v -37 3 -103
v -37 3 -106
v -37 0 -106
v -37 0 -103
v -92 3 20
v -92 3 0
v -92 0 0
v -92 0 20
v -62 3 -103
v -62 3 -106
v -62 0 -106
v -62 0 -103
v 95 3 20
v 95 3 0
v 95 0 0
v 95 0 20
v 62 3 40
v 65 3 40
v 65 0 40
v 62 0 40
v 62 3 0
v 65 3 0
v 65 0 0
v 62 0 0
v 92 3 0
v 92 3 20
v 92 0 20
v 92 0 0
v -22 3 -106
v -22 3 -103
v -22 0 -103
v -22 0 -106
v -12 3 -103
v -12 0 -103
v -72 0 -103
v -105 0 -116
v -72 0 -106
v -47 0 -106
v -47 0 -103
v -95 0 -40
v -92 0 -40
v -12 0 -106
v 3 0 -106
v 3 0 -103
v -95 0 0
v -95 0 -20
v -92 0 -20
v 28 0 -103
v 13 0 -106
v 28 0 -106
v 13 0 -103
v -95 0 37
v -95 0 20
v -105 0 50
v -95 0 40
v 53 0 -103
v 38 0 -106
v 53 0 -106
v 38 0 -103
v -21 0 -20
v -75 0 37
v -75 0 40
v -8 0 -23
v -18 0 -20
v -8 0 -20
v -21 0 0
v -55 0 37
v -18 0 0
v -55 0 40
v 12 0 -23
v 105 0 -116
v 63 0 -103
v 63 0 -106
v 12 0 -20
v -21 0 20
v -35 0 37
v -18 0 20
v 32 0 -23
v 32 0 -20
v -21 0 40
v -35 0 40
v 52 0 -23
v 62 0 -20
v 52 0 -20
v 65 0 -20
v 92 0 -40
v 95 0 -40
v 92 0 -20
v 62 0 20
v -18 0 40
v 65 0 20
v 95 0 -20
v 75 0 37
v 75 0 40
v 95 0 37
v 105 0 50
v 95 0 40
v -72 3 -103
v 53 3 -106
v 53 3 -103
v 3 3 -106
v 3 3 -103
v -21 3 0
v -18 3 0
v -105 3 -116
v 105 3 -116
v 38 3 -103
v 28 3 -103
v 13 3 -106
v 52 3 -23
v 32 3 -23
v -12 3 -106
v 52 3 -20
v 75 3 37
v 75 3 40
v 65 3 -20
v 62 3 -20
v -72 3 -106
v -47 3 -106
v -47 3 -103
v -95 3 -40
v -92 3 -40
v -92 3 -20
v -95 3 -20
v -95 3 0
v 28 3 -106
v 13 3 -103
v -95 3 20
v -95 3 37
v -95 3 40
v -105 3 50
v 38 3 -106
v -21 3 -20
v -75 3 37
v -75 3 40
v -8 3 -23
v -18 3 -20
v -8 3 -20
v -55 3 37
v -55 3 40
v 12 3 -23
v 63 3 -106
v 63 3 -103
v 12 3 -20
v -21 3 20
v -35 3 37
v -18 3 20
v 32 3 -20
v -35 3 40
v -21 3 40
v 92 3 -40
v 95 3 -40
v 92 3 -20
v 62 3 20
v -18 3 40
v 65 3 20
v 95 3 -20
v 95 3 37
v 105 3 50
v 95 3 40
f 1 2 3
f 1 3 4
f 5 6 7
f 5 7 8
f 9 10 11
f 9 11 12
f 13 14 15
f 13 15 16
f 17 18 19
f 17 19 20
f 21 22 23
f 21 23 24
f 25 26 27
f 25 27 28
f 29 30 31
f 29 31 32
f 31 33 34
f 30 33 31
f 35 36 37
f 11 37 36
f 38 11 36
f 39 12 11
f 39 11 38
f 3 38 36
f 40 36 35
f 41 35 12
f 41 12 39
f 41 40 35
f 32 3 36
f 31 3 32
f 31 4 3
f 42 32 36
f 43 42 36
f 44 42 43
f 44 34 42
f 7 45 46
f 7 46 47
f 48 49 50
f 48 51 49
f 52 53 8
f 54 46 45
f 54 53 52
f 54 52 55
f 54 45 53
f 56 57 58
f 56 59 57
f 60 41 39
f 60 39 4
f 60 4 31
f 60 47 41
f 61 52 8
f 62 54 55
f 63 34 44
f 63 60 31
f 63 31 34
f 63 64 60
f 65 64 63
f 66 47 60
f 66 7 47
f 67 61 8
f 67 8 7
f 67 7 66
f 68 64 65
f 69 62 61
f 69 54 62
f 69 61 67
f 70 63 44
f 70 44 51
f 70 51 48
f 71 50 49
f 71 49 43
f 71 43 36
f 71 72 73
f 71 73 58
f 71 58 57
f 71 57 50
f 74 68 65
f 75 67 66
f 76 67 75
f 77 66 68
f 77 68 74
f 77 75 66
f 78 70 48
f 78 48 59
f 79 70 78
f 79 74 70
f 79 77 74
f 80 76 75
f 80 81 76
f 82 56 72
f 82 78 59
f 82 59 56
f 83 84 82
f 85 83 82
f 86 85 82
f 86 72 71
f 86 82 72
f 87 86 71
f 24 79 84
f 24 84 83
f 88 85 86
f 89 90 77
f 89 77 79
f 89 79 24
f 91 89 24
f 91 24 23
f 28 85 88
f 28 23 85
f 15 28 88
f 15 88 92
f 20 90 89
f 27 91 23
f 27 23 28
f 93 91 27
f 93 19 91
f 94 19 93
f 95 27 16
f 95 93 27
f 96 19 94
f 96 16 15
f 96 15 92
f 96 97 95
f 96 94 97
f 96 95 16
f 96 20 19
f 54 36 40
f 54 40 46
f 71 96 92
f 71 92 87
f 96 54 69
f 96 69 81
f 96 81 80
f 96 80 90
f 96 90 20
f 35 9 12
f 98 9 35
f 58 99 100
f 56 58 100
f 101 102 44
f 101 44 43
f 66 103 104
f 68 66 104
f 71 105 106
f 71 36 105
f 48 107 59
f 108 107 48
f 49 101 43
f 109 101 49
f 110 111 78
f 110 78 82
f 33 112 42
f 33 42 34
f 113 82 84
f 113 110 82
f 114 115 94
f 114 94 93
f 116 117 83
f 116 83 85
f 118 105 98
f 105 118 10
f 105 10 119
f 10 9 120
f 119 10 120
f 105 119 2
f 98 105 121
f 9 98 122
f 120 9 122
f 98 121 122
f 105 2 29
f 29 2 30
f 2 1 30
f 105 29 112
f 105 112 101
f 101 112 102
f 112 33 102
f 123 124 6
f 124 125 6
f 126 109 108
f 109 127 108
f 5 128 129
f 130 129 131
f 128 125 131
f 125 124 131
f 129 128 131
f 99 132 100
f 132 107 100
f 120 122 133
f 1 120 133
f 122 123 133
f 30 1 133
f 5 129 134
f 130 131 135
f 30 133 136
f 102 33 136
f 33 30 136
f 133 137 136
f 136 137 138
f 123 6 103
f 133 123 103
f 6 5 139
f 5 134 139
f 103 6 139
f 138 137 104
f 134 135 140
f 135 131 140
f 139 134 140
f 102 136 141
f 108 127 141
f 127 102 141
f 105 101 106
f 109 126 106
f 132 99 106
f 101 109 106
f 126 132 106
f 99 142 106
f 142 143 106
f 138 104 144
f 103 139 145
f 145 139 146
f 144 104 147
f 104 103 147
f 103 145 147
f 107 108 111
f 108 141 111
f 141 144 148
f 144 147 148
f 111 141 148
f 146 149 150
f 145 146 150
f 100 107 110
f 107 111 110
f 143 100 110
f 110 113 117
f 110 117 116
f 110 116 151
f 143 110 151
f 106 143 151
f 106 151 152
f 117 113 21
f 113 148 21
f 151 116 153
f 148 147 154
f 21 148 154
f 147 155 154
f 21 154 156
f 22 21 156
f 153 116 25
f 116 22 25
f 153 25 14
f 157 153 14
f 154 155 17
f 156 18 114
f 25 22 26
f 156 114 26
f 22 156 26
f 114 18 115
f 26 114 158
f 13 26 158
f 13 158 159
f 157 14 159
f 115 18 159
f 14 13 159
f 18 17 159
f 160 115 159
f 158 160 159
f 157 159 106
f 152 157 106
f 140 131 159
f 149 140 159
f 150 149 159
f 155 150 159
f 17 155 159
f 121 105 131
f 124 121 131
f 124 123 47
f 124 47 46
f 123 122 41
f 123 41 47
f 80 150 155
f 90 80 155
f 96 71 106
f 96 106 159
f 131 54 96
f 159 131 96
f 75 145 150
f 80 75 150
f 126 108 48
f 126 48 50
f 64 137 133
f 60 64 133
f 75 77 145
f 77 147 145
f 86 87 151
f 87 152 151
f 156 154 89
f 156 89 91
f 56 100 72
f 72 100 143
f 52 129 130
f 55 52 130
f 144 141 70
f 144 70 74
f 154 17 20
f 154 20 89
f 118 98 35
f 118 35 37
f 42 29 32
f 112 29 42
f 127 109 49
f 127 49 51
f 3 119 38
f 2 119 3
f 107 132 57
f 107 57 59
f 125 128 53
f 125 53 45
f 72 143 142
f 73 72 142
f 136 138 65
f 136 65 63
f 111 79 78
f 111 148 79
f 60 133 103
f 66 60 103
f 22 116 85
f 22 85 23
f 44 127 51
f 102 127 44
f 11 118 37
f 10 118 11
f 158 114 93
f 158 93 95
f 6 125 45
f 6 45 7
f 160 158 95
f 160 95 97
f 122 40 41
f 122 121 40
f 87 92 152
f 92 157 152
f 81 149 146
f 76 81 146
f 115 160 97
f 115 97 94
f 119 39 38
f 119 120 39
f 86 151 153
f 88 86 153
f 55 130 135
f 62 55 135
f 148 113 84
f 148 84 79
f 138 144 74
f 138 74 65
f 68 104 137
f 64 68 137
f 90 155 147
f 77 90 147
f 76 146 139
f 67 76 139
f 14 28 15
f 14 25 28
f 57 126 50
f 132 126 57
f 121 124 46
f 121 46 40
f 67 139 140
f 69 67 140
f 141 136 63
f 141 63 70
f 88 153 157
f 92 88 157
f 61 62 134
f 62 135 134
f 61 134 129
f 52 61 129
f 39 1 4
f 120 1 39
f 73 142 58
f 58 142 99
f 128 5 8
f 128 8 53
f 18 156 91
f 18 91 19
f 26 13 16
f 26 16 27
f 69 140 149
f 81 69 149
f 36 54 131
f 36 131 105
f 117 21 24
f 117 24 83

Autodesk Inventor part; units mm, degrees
ref_plane "YZ Plane" through (0, 0, 0) normal (1, 0, 0) x (0, 1, 0)
ref_plane "XZ Plane" through (0, 0, 0) normal (0, 1, 0) x (-1, 0, 0)
ref_plane "XY Plane" through (0, 0, 0) normal (0, 0, 1) x (1, 0, 0)
sketch "Sketch1" plane through (0, 0, 0) normal (0, 1, 0) x (-1, 0, 0)
  point P0 (0, 0)
sketch "Sketch2" plane through (0, 0, 0) normal (0, 1, 0) x (-1, 0, 0)
  line L0 (105, 50) -> (-105, 50)
  line L1 (-105, 50) -> (-105, -50)
  line L2 (-105, -50) -> (105, -50)
  line L3 (105, -50) -> (105, 50)
  line L4 (105, 50) -> (-105, -50) construction
  line L5 (-105, 50) -> (105, -50) construction
  point P0 (0, 0)
  dimension "d0" = 210
  dimension "d1" = 100
extrude "Extrusion1" add sketch "Sketch2" along normal blind 3
sketch "Sketch3" plane through (0, 3, 0) normal (0, 1, 0) x (1, 0, 0)
  line L0 (-21, 0) -> (-18, 0)
  line L1 (-18, 0) -> (-18, 20)
  line L2 (-18, 20) -> (-21, 20)
  line L3 (-21, 20) -> (-21, 0)
  line L4 (-21, 0) -> (-18, 20) construction
  line L5 (-18, 0) -> (-21, 20) construction
  line L6 (105, 50) -> (-105, 50) projected
  line L7 (62, 20) -> (65, 20)
  line L8 (65, 20) -> (65, 0)
  line L9 (65, 0) -> (62, 0)
  line L10 (62, 0) -> (62, 20)
  line L11 (62, 20) -> (65, 0) construction
  line L12 (65, 20) -> (62, 0) construction
  line L13 (105, -50) -> (105, 50) projected
  line L14 (-21, -40) -> (-18, -40)
  line L15 (-18, -40) -> (-18, -20)
  line L16 (-18, -20) -> (-21, -20)
  line L17 (-21, -20) -> (-21, -40)
  line L18 (-21, -40) -> (-18, -20) construction
  line L19 (-18, -40) -> (-21, -20) construction
  line L20 (-105, -50) -> (105, -50) projected
  line L21 (62, -20) -> (65, -20)
  line L22 (65, -20) -> (65, -40)
  line L23 (65, -40) -> (62, -40)
  line L24 (62, -40) -> (62, -20)
  line L25 (62, -20) -> (65, -40) construction
  line L26 (65, -20) -> (62, -40) construction
  line L27 (-8, 24.65) -> (12, 24.65)
  line L28 (12, 24.65) -> (12, 21.65)
  line L29 (12, 21.65) -> (-8, 21.65)
  line L30 (-8, 21.65) -> (-8, 24.65)
  line L31 (-8, 24.65) -> (12, 21.65) construction
  line L32 (12, 24.65) -> (-8, 21.65) construction
  line L33 (32, 24.65) -> (52, 24.65)
  line L34 (52, 24.65) -> (52, 21.65)
  line L35 (52, 21.65) -> (32, 21.65)
  line L36 (32, 21.65) -> (32, 24.65)
  line L37 (32, 24.65) -> (52, 21.65) construction
  line L38 (52, 24.65) -> (32, 21.65) construction
  line L39 (-105, -50) -> (105, -50) projected
  line L40 (105, -50) -> (105, 50) projected
  line L41 (105, 50) -> (-105, 50) projected
  line L42 (-105, 50) -> (-105, -50) projected
  point P0 (0, 0)
  point P1 (-19.5, 10)
  point P2 (63.5, 10)
  point P3 (-19.5, -30)
  point P4 (63.5, -30)
  point P5 (2, 23.15)
  point P6 (42, 23.15)
  dimension "d4" = 3
  dimension "d5" = 20
  dimension "d6" = 30
  dimension "d7" = 3
  dimension "d8" = 20
  dimension "d9" = 30
  dimension "d10" = 80
  dimension "d11" = 40
  dimension "d14" = 20
  dimension "d15" = 10
  dimension "d16" = 20
  dimension "d17" = 3
  dimension "d18" = 10
  dimension "d19" = 20
  dimension "d20" = 3
  dimension "d21" = 10
extrude "Extrusion2" cut sketch "Sketch3" against normal through all contours L3 L2 L1 L0 | L7 L8 L9 L10
sketch "Sketch4" plane through (0, 3, 0) normal (0, 1, 0) x (1, 0, 0)
  point P0 (0, 0)
sketch "Sketch5" plane through (0, 3, 0) normal (0, 1, 0) x (1, 0, 0)
  line L0 (-21, 0) -> (-21, 20) projected
  line L1 (-18, 20) -> (-18, 0) projected
  line L2 (-21, 20) -> (-18, 20) projected
  line L3 (-18, 0) -> (-21, 0) projected
  line L4 (62, 0) -> (62, 20) projected
  line L5 (65, 0) -> (62, 0) projected
  line L6 (65, 20) -> (65, 0) projected
  line L7 (62, 20) -> (65, 20) projected
  point P0 (0, 0)
sketch "Sketch6" plane through (0, 3, 0) normal (0, 1, 0) x (1, 0, 0)
  line L0 (-21, 0) -> (-18, 0)
  line L1 (-18, 0) -> (-18, 20)
  line L2 (-18, 20) -> (-21, 20)
  line L3 (-21, 20) -> (-21, 0)
  line L4 (-21, 0) -> (-18, 20) construction
  line L5 (-18, 0) -> (-21, 20) construction
  line L6 (105, 50) -> (-105, 50)
  line L7 (62, 20) -> (65, 20)
  line L8 (65, 20) -> (65, 0)
  line L9 (65, 0) -> (62, 0)
  line L10 (62, 0) -> (62, 20)
  line L11 (62, 20) -> (65, 0) construction
  line L12 (65, 20) -> (62, 0) construction
  line L13 (105, -50) -> (105, 50)
  line L14 (-21, -40) -> (-18, -40)
  line L15 (-18, -40) -> (-18, -20)
  line L16 (-18, -20) -> (-21, -20)
  line L17 (-21, -20) -> (-21, -40)
  line L18 (-21, -40) -> (-18, -20) construction
  line L19 (-18, -40) -> (-21, -20) construction
  line L20 (-105, -50) -> (105, -50)
  line L21 (62, -20) -> (65, -20)
  line L22 (65, -20) -> (65, -40)
  line L23 (65, -40) -> (62, -40)
  line L24 (62, -40) -> (62, -20)
  line L25 (62, -20) -> (65, -40) construction
  line L26 (65, -20) -> (62, -40) construction
  line L27 (-8, 23) -> (12, 23)
  line L28 (12, 23) -> (12, 20)
  line L29 (12, 20) -> (-8, 20)
  line L30 (-8, 20) -> (-8, 23)
  line L31 (-8, 23) -> (12, 20) construction
  line L32 (12, 23) -> (-8, 20) construction
  line L33 (32, 23) -> (52, 23)
  line L34 (52, 23) -> (52, 20)
  line L35 (52, 20) -> (32, 20)
  line L36 (32, 20) -> (32, 23)
  line L37 (32, 23) -> (52, 20) construction
  line L38 (52, 23) -> (32, 20) construction
  line L39 (-105, -50) -> (105, -50)
  line L40 (105, -50) -> (105, 50)
  line L41 (105, 50) -> (-105, 50)
  line L42 (-105, 50) -> (-105, -50)
  point P0 (0, 0)
  point P1 (0, 0)
  point P2 (-19.5, 10)
  point P3 (63.5, 10)
  point P4 (-19.5, -30)
  point P5 (63.5, -30)
  point P6 (2, 21.5)
  point P7 (42, 21.5)
  dimension "d22" = 3
  dimension "d23" = 20
  dimension "d24" = 30
  dimension "d25" = 3
  dimension "d26" = 20
  dimension "d27" = 30
  dimension "d28" = 80
  dimension "d29" = 40
  dimension "d30" = 20
  dimension "d31" = 10
  dimension "d32" = 20
  dimension "d33" = 3
  dimension "d34" = 10
  dimension "d35" = 20
  dimension "d36" = 3
  dimension "d37" = 10
  dimension "d41" = 100
  dimension "d42" = 70
extrude "Extrusion3" cut sketch "Sketch6" against normal through all contours L17 L16 L15 L14 | L21 L22 L23 L24 | L27 L28 L29 L30 | L33 L34 L35 L36
sketch "Sketch7" plane through (0, 3, 0) normal (0, 1, 0) x (1, 0, 0)
  line L0 (-21, -40) -> (-21, -20) projected
  line L1 (-18, -20) -> (-18, -40) projected
  line L2 (-21, -20) -> (-18, -20) projected
  line L3 (-18, -40) -> (-21, -40) projected
  line L4 (62, -40) -> (62, -20) projected
  line L5 (65, -40) -> (62, -40) projected
  line L6 (65, -20) -> (65, -40) projected
  line L7 (62, -20) -> (65, -20) projected
  line L8 (-105, 50) -> (-105, -50) projected
  line L9 (-105, -50) -> (105, -50) projected
  line L10 (-95, -40) -> (-75, -40)
  line L11 (-75, -40) -> (-75, -37)
  line L12 (-75, -37) -> (-95, -37)
  line L13 (-95, -37) -> (-95, -40)
  line L14 (-55, -40) -> (-35, -40)
  line L15 (-35, -40) -> (-35, -37)
  line L16 (-35, -37) -> (-55, -37)
  line L17 (-55, -37) -> (-55, -40)
  line L18 (105, -50) -> (105, 50) projected
  line L19 (95, -40) -> (75, -40)
  line L20 (75, -40) -> (75, -37)
  line L21 (75, -37) -> (95, -37)
  line L22 (95, -37) -> (95, -40)
  line L23 (105, 50) -> (-105, 50) projected
  line L24 (-95, 40) -> (-92, 40)
  line L25 (-92, 40) -> (-92, 20)
  line L26 (-92, 20) -> (-95, 20)
  line L27 (-95, 20) -> (-95, 40)
  line L28 (-95, 0) -> (-92, 0)
  line L29 (-92, 0) -> (-92, -20)
  line L30 (-92, -20) -> (-95, -20)
  line L31 (-95, -20) -> (-95, 0)
  line L32 (95, 40) -> (92, 40)
  line L33 (92, 40) -> (92, 20)
  line L34 (92, 20) -> (95, 20)
  line L35 (95, 20) -> (95, 40)
  line L36 (95, -20) -> (92, -20)
  line L37 (92, -20) -> (92, 0)
  line L38 (92, 0) -> (95, 0)
  line L39 (95, 0) -> (95, -20)
  line L40 (-72, 103) -> (-62, 103)
  line L41 (-62, 103) -> (-62, 100)
  line L42 (-62, 100) -> (-72, 100)
  line L43 (-72, 100) -> (-72, 103)
  line L44 (-47, 103) -> (-37, 103)
  line L45 (-37, 103) -> (-37, 100)
  line L46 (-37, 100) -> (-47, 100)
  line L47 (-47, 100) -> (-47, 103)
  line L48 (-22, 103) -> (-12, 103)
  line L49 (-12, 103) -> (-12, 100)
  line L50 (-12, 100) -> (-22, 100)
  line L51 (-22, 100) -> (-22, 103)
  line L52 (3, 103) -> (13, 103)
  line L53 (13, 103) -> (13, 100)
  line L54 (13, 100) -> (3, 100)
  line L55 (3, 100) -> (3, 103)
  line L56 (28, 103) -> (38, 103)
  line L57 (38, 103) -> (38, 100)
  line L58 (38, 100) -> (28, 100)
  line L59 (28, 100) -> (28, 103)
  line L60 (53, 100) -> (63, 100)
  line L61 (63, 100) -> (63, 103)
  line L62 (63, 103) -> (53, 103)
  line L63 (53, 103) -> (53, 100)
  point P0 (0, 0)
  point P1 (-105, 48)
  point P2 (-105, -48)
  point P3 (-103, -50)
  point P4 (103, -50)
  point P5 (105, -48)
  point P6 (105, 48)
  point P7 (103, 50)
  point P8 (-103, 50)
  dimension "d43" = 10
  dimension "d44" = 10
  dimension "d45" = 20
  dimension "d46" = 3
  dimension "d47" = 20
  dimension "d48" = 3
  dimension "d49" = 20
  dimension "d50" = 10
  dimension "d51" = 10
  dimension "d52" = 20
  dimension "d53" = 3
  dimension "d54" = 10
  dimension "d55" = 10
  dimension "d56" = 10
  dimension "d57" = 10
  dimension "d58" = 3
  dimension "d59" = 20
  dimension "d60" = 3
  dimension "d61" = 20
  dimension "d62" = 20
  dimension "d63" = 3
  dimension "d64" = 20
  dimension "d65" = 20
  dimension "d66" = 10
  dimension "d67" = 3
  dimension "d68" = 20
  dimension "d69" = 10
  dimension "d70" = 3
  dimension "d71" = 15
  dimension "d72" = 10
  dimension "d73" = 10
  dimension "d74" = 10
  dimension "d75" = 15
  dimension "d76" = 15
  dimension "d77" = 15
  dimension "d78" = 10
  dimension "d79" = 15
  dimension "d82" = 140
extrude "Extrusion4" cut sketch "Sketch7" against normal through all contours L13 L12 L11 L10 | L17 L16 L15 L14 | L19 L20 L21 L22 | L24 L25 L26 L27 | L28 L29 L30 L31 | L35 L34 L33 L32 | L36 L37 L38 L39 | L40 L41 L42 L43 | L44 L45 L46 L47 | L48 L49 L50 L51 | L52 L53 L54 L55 | L56 L57 L58 L59 | L63 L62 L61 L60
sketch "Sketch8" plane through (0, 3, 0) normal (0, 1, 0) x (1, 0, 0)
  point P0 (0, 0)
sketch "Sketch9" plane through (0, 0, 0) normal (0, -1, 0) x (1, 0, 0)
  line L0 (105, -50) -> (-105, -50) projected
  line L1 (105, -50) -> (-105, -50)
  line L2 (-105, -50) -> (-105, -116)
  line L3 (-105, -116) -> (105, -116)
  line L4 (105, -116) -> (105, -50)
  point P0 (0, 0)
  dimension "d83" = 66
extrude "Extrusion5" add sketch "Sketch9" against normal blind 3
sketch "Sketch10" plane through (0, 3, 0) normal (0, 1, 0) x (1, 0, 0)
  line L0 (-21, -40) -> (-21, -20)
  line L1 (-18, -20) -> (-18, -40)
  line L2 (-21, -20) -> (-18, -20)
  line L3 (-18, -40) -> (-21, -40)
  line L4 (62, -40) -> (62, -20)
  line L5 (65, -40) -> (62, -40)
  line L6 (65, -20) -> (65, -40)
  line L7 (62, -20) -> (65, -20)
  line L8 (-105, 50) -> (-105, -50)
  line L9 (-105, -50) -> (105, -50)
  line L10 (-95, -40) -> (-75, -40)
  line L11 (-75, -40) -> (-75, -37)
  line L12 (-75, -37) -> (-95, -37)
  line L13 (-95, -37) -> (-95, -40)
  line L14 (-55, -40) -> (-35, -40)
  line L15 (-35, -40) -> (-35, -37)
  line L16 (-35, -37) -> (-55, -37)
  line L17 (-55, -37) -> (-55, -40)
  line L18 (105, -50) -> (105, 50)
  line L19 (95, -40) -> (75, -40)
  line L20 (75, -40) -> (75, -37)
  line L21 (75, -37) -> (95, -37)
  line L22 (95, -37) -> (95, -40)
  line L23 (105, 50) -> (-105, 50)
  line L24 (-95, 40) -> (-92, 40)
  line L25 (-92, 40) -> (-92, 20)
  line L26 (-92, 20) -> (-95, 20)
  line L27 (-95, 20) -> (-95, 40)
  line L28 (-95, 0) -> (-92, 0)
  line L29 (-92, 0) -> (-92, -20)
  line L30 (-92, -20) -> (-95, -20)
  line L31 (-95, -20) -> (-95, 0)
  line L32 (95, 40) -> (92, 40)
  line L33 (92, 40) -> (92, 20)
  line L34 (92, 20) -> (95, 20)
  line L35 (95, 20) -> (95, 40)
  line L36 (95, -20) -> (92, -20)
  line L37 (92, -20) -> (92, 0)
  line L38 (92, 0) -> (95, 0)
  line L39 (95, 0) -> (95, -20)
  line L40 (-72, 106) -> (-62, 106)
  line L41 (-62, 106) -> (-62, 103)
  line L42 (-62, 103) -> (-72, 103)
  line L43 (-72, 103) -> (-72, 106)
  line L44 (-47, 106) -> (-37, 106)
  line L45 (-37, 106) -> (-37, 103)
  line L46 (-37, 103) -> (-47, 103)
  line L47 (-47, 103) -> (-47, 106)
  line L48 (-22, 106) -> (-12, 106)
  line L49 (-12, 106) -> (-12, 103)
  line L50 (-12, 103) -> (-22, 103)
  line L51 (-22, 103) -> (-22, 106)
  line L52 (3, 106) -> (13, 106)
  line L53 (13, 106) -> (13, 103)
  line L54 (13, 103) -> (3, 103)
  line L55 (3, 103) -> (3, 106)
  line L56 (28, 106) -> (38, 106)
  line L57 (38, 106) -> (38, 103)
  line L58 (38, 103) -> (28, 103)
  line L59 (28, 103) -> (28, 106)
  line L60 (53, 103) -> (63, 103)
  line L61 (63, 103) -> (63, 106)
  line L62 (63, 106) -> (53, 106)
  line L63 (53, 106) -> (53, 103)
  line L64 (105, 116) -> (-105, 116) projected
  point P0 (0, 0)
  point P1 (0, 0)
  point P2 (-105, 48)
  point P3 (-105, -48)
  point P4 (-103, -50)
  point P5 (103, -50)
  point P6 (105, -48)
  point P7 (105, 48)
  point P8 (103, 50)
  point P9 (-103, 50)
  dimension "d86" = 10
  dimension "d87" = 10
  dimension "d88" = 20
  dimension "d89" = 3
  dimension "d90" = 20
  dimension "d91" = 3
  dimension "d92" = 20
  dimension "d93" = 10
  dimension "d94" = 10
  dimension "d95" = 20
  dimension "d96" = 3
  dimension "d97" = 10
  dimension "d98" = 10
  dimension "d99" = 10
  dimension "d100" = 10
  dimension "d101" = 3
  dimension "d102" = 20
  dimension "d103" = 3
  dimension "d104" = 20
  dimension "d105" = 20
  dimension "d106" = 3
  dimension "d107" = 20
  dimension "d108" = 20
  dimension "d109" = 10
  dimension "d110" = 3
  dimension "d111" = 20
  dimension "d112" = 10
  dimension "d113" = 3
  dimension "d114" = 15
  dimension "d115" = 10
  dimension "d116" = 10
  dimension "d117" = 10
  dimension "d118" = 15
  dimension "d119" = 15
  dimension "d120" = 15
  dimension "d121" = 10
  dimension "d122" = 15
  dimension "d126" = 10
  dimension "d127" = 3
extrude "Extrusion6" cut sketch "Sketch10" against normal through all contours L40 L41 L42 L43 | L44 L45 L46 L47 | L48 L49 L50 L51 | L52 L53 L54 L55 | L56 L57 L58 L59 | L63 L62 L61 L60
equation "\"d9\" = d6"
equation "\"d21\" = d18"
equation "\"d27\" = d24"
equation "\"d37\" = d34"
equation "\"d44\" = d43"
equation "\"d75\" = d71"
equation "\"d76\" = d75"
equation "\"d77\" = d76"
equation "\"d79\" = d76"
properties part number "base"
